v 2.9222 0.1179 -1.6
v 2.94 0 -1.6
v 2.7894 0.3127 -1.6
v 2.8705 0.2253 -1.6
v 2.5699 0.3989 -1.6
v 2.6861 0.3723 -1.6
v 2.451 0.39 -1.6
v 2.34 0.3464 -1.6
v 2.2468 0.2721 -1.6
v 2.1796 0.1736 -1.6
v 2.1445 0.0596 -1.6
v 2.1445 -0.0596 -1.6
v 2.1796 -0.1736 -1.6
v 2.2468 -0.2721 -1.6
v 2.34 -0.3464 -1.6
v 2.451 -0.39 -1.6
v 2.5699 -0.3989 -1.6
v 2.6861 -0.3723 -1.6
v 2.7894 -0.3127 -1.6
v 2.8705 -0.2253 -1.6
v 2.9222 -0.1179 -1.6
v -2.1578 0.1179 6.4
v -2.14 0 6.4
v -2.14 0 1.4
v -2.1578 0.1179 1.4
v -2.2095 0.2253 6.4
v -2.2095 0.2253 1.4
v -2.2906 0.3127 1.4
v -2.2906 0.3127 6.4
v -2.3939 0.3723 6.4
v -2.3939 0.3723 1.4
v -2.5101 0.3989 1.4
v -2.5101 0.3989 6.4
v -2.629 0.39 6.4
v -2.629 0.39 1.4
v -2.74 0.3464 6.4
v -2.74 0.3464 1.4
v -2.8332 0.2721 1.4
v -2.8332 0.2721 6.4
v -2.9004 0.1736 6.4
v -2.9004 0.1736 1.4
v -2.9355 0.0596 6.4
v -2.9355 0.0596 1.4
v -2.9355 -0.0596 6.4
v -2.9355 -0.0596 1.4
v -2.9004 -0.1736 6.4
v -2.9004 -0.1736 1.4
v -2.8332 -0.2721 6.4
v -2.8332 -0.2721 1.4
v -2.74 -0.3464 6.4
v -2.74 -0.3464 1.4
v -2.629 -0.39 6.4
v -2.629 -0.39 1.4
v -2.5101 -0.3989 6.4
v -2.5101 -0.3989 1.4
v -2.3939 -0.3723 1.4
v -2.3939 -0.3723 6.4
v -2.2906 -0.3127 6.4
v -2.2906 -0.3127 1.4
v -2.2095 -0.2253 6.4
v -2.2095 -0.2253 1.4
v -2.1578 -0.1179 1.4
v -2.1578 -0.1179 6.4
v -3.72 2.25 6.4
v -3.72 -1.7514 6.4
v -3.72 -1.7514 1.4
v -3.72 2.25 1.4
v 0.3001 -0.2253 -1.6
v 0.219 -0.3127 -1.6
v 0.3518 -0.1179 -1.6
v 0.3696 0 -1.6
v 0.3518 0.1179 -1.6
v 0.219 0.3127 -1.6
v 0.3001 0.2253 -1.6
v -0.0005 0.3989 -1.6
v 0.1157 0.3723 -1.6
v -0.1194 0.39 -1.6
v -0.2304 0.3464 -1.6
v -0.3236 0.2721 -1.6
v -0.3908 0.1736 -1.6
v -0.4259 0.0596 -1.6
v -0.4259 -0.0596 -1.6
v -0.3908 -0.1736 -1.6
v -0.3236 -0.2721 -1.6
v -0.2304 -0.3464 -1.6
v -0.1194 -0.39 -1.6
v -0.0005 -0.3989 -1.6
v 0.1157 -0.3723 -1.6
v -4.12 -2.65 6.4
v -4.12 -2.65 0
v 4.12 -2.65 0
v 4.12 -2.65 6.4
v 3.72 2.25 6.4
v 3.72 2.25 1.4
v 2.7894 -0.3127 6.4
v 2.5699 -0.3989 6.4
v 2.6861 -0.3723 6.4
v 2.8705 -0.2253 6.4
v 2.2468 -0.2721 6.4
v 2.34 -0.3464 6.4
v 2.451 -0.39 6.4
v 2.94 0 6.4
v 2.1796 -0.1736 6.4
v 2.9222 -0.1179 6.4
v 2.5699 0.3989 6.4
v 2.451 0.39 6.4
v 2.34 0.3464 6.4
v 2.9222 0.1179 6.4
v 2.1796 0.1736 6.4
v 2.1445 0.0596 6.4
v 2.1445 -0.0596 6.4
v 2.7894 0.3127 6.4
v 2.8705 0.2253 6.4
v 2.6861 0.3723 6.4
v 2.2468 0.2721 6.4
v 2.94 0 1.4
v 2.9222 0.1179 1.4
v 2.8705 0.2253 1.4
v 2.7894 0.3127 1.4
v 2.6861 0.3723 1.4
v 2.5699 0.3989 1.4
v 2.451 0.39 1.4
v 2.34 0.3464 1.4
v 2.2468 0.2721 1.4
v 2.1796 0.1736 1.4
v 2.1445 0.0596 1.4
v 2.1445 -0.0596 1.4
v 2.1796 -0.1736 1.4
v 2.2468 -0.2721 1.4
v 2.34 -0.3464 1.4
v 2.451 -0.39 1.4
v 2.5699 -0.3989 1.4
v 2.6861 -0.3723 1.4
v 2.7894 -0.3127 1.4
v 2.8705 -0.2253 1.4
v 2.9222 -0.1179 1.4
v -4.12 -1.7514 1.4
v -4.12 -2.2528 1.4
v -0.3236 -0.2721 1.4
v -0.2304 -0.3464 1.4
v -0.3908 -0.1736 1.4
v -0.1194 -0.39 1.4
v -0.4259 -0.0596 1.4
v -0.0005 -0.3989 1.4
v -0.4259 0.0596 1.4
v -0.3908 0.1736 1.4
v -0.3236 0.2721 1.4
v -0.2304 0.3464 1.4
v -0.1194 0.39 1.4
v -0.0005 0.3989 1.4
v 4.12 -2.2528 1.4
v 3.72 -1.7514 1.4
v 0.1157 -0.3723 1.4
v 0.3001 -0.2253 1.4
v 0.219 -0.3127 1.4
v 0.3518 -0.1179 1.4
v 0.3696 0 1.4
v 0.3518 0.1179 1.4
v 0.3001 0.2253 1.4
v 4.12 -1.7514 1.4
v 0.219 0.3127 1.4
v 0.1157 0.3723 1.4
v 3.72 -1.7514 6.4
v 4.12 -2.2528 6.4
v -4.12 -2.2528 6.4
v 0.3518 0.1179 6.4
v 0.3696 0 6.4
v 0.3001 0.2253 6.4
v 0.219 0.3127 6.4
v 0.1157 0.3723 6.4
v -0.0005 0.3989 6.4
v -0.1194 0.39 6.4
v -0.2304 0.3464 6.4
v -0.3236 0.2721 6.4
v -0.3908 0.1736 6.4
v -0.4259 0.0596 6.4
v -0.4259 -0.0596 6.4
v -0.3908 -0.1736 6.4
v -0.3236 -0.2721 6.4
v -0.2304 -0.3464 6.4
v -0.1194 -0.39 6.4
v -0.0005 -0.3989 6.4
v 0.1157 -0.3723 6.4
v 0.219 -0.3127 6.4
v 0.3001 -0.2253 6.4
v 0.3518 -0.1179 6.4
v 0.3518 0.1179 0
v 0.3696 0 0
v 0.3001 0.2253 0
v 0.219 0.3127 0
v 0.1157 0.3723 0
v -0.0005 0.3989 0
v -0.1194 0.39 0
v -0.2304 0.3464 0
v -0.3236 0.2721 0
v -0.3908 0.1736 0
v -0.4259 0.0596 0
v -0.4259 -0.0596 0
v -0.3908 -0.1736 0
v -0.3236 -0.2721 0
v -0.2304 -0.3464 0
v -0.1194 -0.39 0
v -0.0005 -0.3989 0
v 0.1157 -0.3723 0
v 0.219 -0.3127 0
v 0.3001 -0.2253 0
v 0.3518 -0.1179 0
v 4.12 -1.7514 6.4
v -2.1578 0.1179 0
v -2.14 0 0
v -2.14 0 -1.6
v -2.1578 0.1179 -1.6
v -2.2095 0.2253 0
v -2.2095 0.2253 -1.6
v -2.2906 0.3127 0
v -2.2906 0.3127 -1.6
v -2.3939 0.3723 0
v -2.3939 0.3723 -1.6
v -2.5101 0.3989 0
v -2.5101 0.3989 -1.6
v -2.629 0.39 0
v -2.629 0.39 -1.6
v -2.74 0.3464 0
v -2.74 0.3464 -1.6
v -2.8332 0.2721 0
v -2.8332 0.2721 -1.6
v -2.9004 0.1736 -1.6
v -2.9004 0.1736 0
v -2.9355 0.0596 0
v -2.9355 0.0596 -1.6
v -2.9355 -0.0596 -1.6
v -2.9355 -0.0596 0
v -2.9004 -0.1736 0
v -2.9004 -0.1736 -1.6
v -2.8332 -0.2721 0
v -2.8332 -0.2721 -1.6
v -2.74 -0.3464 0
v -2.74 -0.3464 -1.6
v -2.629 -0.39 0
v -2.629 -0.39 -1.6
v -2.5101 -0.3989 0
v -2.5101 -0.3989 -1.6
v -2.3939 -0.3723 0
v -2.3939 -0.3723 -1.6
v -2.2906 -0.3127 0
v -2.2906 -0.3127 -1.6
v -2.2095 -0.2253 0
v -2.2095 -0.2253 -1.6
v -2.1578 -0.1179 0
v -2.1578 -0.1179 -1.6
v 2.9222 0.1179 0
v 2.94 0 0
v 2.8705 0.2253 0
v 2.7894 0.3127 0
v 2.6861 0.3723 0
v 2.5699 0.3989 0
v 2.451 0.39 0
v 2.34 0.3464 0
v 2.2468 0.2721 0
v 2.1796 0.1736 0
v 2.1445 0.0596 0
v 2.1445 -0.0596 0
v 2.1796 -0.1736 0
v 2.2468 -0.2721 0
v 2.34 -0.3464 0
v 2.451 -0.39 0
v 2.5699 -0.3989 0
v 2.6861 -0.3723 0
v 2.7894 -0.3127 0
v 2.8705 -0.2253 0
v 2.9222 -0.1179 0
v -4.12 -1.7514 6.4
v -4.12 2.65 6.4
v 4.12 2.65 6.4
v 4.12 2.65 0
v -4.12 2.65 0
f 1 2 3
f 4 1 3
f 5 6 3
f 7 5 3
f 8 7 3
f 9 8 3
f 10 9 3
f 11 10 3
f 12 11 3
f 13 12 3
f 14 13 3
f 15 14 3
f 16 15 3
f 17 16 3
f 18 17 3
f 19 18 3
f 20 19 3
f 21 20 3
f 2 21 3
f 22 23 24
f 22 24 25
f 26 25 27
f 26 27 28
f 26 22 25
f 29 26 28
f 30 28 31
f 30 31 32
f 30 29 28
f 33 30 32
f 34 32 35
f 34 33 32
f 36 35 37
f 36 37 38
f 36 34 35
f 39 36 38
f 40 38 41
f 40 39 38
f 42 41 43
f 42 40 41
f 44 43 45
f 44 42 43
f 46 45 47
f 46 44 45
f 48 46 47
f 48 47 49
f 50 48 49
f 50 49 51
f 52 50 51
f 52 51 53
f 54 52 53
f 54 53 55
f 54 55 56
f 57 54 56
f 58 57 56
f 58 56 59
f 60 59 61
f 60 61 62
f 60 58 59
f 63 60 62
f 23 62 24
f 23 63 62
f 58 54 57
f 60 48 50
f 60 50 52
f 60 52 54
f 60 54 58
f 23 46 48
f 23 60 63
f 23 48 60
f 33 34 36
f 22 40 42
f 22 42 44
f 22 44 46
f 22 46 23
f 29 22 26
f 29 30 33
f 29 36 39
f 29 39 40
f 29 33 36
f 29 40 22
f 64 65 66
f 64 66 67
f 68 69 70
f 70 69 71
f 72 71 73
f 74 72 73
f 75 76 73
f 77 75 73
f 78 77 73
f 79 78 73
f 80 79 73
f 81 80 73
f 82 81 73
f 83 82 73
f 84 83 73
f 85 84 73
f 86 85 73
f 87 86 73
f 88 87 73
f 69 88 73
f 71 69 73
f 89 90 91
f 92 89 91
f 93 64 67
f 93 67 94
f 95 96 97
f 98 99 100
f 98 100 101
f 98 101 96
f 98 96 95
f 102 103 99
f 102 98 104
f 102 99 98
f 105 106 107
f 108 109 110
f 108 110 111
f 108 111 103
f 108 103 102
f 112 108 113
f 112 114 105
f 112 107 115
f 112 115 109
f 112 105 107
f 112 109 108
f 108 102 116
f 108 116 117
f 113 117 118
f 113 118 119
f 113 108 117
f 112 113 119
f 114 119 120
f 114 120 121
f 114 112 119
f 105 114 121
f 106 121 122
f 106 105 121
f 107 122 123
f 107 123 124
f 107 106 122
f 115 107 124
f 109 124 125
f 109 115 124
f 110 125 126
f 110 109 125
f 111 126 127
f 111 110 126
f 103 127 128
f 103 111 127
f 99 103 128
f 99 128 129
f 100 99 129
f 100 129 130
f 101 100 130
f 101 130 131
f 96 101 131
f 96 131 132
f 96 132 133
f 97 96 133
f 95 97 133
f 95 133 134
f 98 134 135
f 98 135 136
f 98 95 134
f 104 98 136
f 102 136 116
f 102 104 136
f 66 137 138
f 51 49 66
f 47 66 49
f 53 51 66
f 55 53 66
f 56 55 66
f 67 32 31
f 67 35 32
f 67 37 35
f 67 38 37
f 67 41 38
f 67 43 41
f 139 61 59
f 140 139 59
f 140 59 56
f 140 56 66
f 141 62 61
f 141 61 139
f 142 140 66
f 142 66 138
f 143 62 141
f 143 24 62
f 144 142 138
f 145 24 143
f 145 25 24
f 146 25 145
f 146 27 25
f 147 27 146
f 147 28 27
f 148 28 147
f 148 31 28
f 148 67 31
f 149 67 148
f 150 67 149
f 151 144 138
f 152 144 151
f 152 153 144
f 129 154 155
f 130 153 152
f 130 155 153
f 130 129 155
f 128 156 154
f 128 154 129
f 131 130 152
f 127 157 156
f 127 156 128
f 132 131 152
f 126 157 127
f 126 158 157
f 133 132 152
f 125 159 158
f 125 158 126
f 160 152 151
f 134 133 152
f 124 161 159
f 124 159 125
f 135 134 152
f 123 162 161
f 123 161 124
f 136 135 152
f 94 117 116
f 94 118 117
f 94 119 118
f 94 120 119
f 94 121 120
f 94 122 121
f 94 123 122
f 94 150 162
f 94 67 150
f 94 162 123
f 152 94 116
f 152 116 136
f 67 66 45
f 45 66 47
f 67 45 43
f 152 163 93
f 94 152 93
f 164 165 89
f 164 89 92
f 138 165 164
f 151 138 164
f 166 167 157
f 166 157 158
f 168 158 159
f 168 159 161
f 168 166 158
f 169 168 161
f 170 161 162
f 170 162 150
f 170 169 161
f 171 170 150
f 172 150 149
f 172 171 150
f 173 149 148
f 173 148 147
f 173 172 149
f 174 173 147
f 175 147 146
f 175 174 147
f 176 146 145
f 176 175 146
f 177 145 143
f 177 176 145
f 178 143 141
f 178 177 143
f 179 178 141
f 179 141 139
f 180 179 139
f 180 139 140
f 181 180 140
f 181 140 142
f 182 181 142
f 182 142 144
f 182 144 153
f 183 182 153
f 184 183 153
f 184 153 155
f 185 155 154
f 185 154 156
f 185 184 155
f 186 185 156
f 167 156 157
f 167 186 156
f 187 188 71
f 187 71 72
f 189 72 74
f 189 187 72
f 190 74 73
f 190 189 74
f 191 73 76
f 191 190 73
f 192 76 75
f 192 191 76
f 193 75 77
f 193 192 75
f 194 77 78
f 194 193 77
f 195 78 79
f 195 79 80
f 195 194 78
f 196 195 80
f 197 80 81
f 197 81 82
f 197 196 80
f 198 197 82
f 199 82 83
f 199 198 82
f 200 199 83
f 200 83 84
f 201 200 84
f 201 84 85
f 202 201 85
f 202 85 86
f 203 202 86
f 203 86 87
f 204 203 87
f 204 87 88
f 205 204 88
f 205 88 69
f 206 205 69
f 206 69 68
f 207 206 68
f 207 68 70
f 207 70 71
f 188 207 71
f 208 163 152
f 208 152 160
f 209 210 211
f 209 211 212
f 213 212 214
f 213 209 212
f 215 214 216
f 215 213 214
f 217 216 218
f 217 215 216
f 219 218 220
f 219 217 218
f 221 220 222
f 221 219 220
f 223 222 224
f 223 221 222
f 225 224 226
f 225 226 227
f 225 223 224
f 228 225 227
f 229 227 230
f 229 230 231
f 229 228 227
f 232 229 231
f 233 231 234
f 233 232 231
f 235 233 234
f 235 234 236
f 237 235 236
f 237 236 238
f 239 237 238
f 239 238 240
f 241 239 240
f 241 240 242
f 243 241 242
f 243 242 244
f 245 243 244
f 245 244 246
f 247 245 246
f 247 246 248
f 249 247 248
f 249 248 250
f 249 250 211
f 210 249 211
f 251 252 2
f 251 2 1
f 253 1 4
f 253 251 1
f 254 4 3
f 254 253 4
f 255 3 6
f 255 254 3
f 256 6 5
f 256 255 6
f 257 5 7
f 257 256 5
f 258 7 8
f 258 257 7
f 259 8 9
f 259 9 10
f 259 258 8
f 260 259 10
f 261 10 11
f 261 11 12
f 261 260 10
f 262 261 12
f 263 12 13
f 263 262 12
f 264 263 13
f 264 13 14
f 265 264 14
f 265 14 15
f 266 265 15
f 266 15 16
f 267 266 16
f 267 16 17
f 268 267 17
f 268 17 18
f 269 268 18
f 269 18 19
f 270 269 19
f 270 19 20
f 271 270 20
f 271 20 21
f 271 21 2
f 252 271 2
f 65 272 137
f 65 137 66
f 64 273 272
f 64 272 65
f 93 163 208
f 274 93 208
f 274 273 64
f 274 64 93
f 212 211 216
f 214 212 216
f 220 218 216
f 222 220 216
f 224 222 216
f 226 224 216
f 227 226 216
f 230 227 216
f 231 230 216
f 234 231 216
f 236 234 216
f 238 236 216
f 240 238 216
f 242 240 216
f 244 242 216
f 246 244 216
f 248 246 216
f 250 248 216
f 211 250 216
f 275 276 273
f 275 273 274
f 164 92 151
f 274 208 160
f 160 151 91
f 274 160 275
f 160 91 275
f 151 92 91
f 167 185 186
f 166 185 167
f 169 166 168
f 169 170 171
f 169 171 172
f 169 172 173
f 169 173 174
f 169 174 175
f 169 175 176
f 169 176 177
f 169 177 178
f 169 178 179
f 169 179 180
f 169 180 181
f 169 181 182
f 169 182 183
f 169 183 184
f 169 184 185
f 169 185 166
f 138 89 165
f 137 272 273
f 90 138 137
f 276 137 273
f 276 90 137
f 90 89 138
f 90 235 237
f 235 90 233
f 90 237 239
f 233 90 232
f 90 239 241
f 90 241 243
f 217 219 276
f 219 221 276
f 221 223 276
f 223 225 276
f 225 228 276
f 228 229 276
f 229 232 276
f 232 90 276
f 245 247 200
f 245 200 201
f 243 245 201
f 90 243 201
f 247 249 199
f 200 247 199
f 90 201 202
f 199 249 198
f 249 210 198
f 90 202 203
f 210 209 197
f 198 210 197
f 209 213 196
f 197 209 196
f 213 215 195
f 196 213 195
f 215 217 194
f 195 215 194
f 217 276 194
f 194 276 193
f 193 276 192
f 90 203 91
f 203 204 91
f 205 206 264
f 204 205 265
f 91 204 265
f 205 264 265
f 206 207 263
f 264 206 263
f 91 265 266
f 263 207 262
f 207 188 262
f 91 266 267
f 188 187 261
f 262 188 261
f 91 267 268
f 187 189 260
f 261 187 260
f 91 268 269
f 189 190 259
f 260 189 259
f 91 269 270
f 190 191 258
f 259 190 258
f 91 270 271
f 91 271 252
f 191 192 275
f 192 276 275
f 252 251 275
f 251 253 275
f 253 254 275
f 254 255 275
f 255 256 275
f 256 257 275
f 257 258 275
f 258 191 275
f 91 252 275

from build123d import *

# Parameters (mm, degrees)
SKETCH_1_W          = 8.24
SKETCH_1_H          = 5.3
EXTRUDE_1_DEPTH     = 6.4
SKETCH_2_W          = 7.44
SKETCH_2_H          = 4.5
SKETCH_2_R          = 0.4
CUT_EXTRUDE_1_DEPTH = 5
SKETCH_3_W          = 9.698331409
SKETCH_3_H          = 0.501475964
CUT_EXTRUDE_2_DEPTH = 5
SKETCH_4_R          = 0.4
EXTRUDE_2_DEPTH     = 8


with BuildPart() as part:
    # Эскиз1 → Вытянуть1 (new body)
    with BuildSketch(Plane.XY):
        Rectangle(SKETCH_1_W, SKETCH_1_H)
    extrude(amount=EXTRUDE_1_DEPTH)

    # Эскиз2 → Вырез-Вытянуть1 (cut)
    with BuildSketch(Plane.XY.offset(6.4)):
        Rectangle(SKETCH_2_W, SKETCH_2_H)
        with Locations((-2.54, 0)):
            Circle(SKETCH_2_R, mode=Mode.SUBTRACT)
        with Locations((2.54, 0)):
            Circle(SKETCH_2_R, mode=Mode.SUBTRACT)
        with Locations((-0.030392483, 0)):
            Circle(SKETCH_2_R, mode=Mode.SUBTRACT)
    extrude(amount=-CUT_EXTRUDE_1_DEPTH, mode=Mode.SUBTRACT)

    # Эскиз3 → Вырез-Вытянуть2 (cut)
    with BuildSketch(Plane.XY.offset(6.4)):
        with Locations((-0.050465246, -2.002104797)):
            Rectangle(SKETCH_3_W, SKETCH_3_H)
    extrude(amount=-CUT_EXTRUDE_2_DEPTH, mode=Mode.SUBTRACT)

    # Эскиз4 → Вытянуть2 (add)
    with BuildSketch(Plane.XY.offset(6.4)):
        with Locations((-2.54, 0)):
            Circle(SKETCH_4_R)
        with Locations((2.54, 0)):
            Circle(SKETCH_4_R)
        with Locations((-0.030392483, 0)):
            Circle(SKETCH_4_R)
    extrude(amount=-EXTRUDE_2_DEPTH)


solid = part.part
